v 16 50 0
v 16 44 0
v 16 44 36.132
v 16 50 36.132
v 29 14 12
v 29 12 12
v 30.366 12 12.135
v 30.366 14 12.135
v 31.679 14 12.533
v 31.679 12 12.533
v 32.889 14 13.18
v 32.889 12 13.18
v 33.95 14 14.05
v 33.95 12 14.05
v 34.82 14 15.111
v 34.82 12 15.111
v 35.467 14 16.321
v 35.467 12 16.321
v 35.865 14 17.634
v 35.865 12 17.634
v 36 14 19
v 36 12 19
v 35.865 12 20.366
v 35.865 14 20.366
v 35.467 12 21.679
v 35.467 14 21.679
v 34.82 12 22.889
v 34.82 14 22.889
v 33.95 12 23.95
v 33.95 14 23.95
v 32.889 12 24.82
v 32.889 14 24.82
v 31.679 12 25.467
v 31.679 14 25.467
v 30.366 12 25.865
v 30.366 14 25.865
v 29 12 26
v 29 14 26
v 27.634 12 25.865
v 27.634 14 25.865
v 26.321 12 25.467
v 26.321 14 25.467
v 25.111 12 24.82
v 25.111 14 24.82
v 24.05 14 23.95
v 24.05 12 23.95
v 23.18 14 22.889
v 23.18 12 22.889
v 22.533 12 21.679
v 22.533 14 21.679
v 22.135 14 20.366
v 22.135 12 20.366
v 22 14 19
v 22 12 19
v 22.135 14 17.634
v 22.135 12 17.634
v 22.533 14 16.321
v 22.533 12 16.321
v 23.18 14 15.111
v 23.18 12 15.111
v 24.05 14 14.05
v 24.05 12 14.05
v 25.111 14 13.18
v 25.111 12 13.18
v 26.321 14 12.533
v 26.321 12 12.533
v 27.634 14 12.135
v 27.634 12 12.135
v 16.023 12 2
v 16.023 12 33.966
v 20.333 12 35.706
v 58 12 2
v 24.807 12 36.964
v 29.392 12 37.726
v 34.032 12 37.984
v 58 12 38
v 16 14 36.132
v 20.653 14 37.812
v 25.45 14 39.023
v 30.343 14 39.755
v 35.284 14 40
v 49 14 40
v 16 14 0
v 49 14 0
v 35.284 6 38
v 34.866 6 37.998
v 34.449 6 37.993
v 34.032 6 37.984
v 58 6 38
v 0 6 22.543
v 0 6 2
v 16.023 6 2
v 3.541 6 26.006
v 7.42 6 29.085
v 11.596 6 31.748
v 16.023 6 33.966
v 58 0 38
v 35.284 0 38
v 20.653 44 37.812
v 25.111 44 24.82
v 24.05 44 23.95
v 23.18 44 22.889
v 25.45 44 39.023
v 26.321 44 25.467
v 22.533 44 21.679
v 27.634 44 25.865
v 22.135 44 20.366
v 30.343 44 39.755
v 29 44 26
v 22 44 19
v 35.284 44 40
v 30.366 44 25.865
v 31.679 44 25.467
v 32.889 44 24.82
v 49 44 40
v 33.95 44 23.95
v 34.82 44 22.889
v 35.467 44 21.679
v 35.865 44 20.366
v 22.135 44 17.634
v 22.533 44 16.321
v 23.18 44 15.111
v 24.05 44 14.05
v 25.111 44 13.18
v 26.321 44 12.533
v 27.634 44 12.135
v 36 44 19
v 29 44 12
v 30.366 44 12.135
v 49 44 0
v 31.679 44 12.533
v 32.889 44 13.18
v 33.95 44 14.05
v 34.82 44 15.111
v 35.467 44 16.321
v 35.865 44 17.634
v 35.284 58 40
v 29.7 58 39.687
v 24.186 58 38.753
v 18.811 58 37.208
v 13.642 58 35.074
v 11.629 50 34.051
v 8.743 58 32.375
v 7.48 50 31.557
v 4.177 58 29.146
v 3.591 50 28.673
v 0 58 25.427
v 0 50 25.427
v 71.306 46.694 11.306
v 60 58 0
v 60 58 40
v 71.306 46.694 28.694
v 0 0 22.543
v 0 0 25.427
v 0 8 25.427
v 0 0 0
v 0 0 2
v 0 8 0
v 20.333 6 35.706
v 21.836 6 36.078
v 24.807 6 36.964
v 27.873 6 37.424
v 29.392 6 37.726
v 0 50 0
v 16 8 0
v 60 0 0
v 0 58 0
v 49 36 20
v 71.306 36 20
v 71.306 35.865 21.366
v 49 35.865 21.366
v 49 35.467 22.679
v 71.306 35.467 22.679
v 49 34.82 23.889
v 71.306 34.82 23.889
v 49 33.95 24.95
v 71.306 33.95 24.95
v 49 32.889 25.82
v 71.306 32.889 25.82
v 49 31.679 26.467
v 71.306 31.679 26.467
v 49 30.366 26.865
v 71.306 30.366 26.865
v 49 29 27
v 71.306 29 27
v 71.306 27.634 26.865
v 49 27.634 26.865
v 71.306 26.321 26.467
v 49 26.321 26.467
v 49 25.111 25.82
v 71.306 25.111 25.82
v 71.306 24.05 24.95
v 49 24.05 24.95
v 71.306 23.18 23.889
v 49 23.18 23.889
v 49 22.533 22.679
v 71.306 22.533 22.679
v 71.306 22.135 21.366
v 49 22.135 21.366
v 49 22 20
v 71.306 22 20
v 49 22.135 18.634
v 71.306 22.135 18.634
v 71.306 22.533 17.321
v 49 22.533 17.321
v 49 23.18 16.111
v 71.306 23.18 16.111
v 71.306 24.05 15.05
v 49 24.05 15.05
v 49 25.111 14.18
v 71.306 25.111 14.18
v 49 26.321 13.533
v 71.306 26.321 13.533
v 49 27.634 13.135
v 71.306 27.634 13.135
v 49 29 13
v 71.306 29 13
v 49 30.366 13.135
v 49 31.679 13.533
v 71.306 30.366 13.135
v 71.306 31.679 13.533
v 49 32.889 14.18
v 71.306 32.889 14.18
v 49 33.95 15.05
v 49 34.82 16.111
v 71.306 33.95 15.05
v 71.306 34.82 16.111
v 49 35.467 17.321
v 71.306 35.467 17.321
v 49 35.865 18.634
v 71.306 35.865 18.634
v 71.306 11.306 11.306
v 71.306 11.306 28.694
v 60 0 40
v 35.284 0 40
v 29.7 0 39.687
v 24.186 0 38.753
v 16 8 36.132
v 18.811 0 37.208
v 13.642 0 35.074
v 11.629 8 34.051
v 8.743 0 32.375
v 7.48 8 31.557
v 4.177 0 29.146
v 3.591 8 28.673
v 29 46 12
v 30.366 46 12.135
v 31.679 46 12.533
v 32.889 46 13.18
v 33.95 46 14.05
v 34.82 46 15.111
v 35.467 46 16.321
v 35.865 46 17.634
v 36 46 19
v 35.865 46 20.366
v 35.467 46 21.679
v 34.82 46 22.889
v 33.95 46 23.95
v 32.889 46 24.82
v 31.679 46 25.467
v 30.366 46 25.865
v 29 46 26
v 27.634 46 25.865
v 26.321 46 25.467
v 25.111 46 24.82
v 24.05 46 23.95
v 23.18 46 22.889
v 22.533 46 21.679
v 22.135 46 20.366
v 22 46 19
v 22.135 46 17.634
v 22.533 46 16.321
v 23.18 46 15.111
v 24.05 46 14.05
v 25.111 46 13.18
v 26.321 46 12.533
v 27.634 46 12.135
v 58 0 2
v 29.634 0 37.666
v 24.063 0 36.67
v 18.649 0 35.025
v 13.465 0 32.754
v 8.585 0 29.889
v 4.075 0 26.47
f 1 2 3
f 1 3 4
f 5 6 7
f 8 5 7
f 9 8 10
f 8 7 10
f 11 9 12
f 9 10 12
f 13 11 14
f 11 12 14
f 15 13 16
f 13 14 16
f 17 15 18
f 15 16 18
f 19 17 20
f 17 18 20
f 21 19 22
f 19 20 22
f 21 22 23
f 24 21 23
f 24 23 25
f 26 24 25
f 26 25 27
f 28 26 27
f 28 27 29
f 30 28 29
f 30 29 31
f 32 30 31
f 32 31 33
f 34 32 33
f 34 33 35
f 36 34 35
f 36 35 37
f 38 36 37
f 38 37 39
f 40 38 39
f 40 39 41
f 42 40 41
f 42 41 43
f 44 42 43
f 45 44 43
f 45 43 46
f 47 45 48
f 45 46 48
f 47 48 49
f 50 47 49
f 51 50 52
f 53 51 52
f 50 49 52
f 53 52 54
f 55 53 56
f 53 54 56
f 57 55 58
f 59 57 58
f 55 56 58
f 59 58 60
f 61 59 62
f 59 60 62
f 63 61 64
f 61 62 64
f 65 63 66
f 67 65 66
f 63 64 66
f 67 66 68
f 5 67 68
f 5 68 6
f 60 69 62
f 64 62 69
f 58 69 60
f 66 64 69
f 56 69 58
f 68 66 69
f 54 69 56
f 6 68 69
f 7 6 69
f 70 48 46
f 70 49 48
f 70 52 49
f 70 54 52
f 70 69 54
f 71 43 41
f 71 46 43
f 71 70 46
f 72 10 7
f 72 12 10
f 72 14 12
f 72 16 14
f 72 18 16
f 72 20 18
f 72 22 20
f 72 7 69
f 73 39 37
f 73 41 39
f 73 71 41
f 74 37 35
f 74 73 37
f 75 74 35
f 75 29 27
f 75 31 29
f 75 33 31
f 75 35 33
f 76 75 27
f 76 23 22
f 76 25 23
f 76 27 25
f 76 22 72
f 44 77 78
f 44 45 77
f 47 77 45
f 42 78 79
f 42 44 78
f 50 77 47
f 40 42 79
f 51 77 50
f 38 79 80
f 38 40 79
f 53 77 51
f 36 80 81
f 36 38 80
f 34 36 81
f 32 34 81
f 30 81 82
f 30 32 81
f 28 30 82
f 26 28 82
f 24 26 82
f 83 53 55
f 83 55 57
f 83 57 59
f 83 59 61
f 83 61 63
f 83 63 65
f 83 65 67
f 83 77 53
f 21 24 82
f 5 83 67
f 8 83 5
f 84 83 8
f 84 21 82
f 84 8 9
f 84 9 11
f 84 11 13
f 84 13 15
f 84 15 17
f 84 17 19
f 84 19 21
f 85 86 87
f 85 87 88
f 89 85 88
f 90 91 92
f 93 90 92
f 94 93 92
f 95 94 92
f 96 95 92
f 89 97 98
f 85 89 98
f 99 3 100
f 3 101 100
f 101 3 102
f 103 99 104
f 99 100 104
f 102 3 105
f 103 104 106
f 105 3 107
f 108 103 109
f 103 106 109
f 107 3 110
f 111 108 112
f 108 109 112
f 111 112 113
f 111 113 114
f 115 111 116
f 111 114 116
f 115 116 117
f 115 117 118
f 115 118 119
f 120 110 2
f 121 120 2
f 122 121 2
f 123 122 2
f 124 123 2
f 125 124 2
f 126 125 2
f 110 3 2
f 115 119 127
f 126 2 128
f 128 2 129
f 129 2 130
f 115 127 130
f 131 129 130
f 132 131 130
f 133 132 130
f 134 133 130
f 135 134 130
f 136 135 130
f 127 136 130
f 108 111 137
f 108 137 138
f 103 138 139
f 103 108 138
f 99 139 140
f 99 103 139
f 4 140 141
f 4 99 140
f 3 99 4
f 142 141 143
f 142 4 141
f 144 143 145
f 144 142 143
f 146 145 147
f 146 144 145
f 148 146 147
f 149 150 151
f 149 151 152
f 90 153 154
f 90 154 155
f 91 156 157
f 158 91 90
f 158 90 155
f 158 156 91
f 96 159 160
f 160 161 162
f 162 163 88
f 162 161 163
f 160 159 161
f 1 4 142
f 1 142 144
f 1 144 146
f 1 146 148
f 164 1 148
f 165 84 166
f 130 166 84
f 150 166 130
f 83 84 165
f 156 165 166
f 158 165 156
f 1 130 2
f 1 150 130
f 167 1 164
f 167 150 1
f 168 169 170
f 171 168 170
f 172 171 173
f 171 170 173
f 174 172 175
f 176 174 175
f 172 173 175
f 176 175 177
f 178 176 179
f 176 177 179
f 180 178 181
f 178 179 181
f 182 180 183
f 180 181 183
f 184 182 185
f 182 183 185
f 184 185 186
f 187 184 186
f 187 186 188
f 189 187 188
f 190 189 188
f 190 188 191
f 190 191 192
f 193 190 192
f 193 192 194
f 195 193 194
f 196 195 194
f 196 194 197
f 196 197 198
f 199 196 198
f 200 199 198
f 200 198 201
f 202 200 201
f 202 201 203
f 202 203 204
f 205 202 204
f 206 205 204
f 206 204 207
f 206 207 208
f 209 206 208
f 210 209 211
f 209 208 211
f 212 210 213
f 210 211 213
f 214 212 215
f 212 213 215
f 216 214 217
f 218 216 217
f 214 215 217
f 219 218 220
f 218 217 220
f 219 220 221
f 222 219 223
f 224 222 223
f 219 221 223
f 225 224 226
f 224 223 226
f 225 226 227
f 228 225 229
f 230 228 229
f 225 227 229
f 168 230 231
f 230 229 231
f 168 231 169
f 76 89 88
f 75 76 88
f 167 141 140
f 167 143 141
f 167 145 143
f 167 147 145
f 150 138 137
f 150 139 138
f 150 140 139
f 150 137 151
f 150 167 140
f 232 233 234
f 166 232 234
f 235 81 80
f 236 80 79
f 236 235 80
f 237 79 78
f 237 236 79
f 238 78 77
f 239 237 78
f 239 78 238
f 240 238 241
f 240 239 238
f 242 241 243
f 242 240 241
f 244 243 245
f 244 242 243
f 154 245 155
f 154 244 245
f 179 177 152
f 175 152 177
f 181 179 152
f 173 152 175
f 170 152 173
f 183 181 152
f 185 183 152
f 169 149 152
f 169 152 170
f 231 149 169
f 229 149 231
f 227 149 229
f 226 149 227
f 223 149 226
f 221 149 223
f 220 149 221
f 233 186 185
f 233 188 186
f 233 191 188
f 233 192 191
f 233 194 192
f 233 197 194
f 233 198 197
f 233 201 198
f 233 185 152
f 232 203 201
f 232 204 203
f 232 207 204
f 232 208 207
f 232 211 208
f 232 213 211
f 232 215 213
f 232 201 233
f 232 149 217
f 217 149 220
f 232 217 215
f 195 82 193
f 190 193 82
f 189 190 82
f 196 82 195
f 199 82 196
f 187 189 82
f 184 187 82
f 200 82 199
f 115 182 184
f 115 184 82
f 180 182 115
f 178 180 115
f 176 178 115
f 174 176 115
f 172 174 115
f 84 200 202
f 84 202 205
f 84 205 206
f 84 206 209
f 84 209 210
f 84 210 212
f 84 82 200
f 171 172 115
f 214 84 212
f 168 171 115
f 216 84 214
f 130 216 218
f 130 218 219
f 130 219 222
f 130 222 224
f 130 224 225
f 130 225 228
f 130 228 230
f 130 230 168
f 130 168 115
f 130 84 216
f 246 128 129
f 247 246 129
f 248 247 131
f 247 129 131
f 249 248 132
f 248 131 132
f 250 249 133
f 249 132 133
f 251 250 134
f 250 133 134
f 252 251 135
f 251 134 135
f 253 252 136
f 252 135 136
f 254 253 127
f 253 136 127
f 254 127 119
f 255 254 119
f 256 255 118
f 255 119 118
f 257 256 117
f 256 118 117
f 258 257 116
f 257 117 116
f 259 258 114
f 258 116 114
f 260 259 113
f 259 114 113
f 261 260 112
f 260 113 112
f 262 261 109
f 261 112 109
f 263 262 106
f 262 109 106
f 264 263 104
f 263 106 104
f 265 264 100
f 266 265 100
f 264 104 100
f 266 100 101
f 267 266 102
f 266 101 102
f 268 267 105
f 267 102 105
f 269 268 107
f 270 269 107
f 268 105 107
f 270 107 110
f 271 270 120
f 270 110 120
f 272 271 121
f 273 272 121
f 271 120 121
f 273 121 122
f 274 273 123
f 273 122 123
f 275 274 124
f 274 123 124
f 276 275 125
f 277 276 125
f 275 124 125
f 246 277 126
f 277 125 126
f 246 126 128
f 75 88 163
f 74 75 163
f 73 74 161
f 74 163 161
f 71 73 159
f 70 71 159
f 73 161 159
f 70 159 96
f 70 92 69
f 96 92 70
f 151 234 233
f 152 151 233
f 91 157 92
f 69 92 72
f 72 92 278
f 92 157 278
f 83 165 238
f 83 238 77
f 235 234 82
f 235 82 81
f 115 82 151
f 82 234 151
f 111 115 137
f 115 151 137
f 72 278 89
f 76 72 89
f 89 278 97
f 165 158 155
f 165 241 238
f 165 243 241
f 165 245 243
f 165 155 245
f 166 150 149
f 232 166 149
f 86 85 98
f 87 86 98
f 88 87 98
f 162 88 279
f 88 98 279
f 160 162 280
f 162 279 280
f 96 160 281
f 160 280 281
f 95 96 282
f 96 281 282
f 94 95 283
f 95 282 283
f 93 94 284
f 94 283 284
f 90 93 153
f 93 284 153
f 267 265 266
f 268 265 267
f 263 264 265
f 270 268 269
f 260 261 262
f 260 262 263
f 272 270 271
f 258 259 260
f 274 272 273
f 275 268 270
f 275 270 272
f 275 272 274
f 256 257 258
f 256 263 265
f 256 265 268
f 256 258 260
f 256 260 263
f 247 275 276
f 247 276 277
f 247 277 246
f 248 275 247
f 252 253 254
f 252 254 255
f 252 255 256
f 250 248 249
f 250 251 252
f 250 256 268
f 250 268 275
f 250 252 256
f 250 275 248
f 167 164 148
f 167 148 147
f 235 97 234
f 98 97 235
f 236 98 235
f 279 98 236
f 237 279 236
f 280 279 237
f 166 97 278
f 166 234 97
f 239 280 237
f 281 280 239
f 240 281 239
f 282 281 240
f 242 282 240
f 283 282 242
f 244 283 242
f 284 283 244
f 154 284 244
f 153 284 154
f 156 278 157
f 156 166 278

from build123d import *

# Parameters (mm, degrees)
BOSS_EXTRUDE1_DEPTH = 40
CUT_EXTRUDE2_DEPTH  = 101.242224803
CUT_EXTRUDE3_DEPTH  = 101.242224803
SKETCH14_R          = 7
CUT_EXTRUDE4_DEPTH  = 101.242224803
CUT_EXTRUDE5_REACH  = 102.242
SKETCH15_R          = 7
SKETCH16_R          = 7
CUT_EXTRUDE6_DEPTH  = 2
CUT_EXTRUDE9_DEPTH  = 6
SKETCH22_W          = 41.976716328
SKETCH22_H          = 31.966333102
CUT_EXTRUDE11_DEPTH = 6
CUT_EXTRUDE12_DEPTH = 6


with BuildPart() as part:
    # Sketch2 → Boss-Extrude1 (new body)
    with BuildSketch(Plane.XY):
        Polygon((60, 58), (71.305705476, 46.694294524), (71.305705476, 11.305705476), (60, 0), (0, 0), (0, 8), (16, 8), (16, 14), (49, 14), (49, 44), (45.974238177, 44), (16, 44), (16, 50), (0, 50), (0, 58), align=None)
    extrude(amount=BOSS_EXTRUDE1_DEPTH)

    # Sketch4 → Cut-Extrude2 (cut, through all)
    with BuildSketch(Plane.XZ):
        with BuildLine():
            Line((0, 25.426887123), (0, 40))
            Line((0, 40), (35.283645911, 40))
            ThreePointArc((35.283645911, 40), (16.196272547, 36.213333337), (0, 25.426887123))
        make_face()
    extrude(amount=-CUT_EXTRUDE2_DEPTH, mode=Mode.SUBTRACT)

    # Sketch12 → Cut-Extrude3 (cut, through all)
    with BuildSketch(Plane(origin=(0, 0, 0), x_dir=(1, 0, 0), z_dir=(0, 1, 0))):
        Polygon((60, 0), (71.305705476, -11.305705476), (71.305705476, 0), align=None)
        Polygon((60, -40), (71.305705476, -28.694294524), (71.305705476, -40), align=None)
    extrude(amount=CUT_EXTRUDE3_DEPTH, mode=Mode.SUBTRACT)

    # Sketch14 → Cut-Extrude4 (cut, through all)
    with BuildSketch(Plane(origin=(71.305705476, 0, 0), x_dir=(0, 0, -1), z_dir=(1, 0, 0))):
        with Locations(Location((-20, 29, 0), (0, 0, 90))):
            Circle(SKETCH14_R)
    extrude(amount=-CUT_EXTRUDE4_DEPTH, mode=Mode.SUBTRACT)

    # Sketch15 → Cut-Extrude5 (cut, up to next)
    with BuildSketch(Plane.XZ, mode=Mode.PRIVATE) as cut_extrude5_sk1:
        with Locations(Location((29, 19, 0), (0, 0, 270))):
            Circle(SKETCH15_R)
    cut_extrude5_tool1 = extrude(cut_extrude5_sk1.sketch, amount=-CUT_EXTRUDE5_REACH, mode=Mode.PRIVATE) & part.part
    add(cut_extrude5_tool1.solids().sort_by_distance((29, 0, 19))[0], mode=Mode.SUBTRACT)

    # Sketch16 → Cut-Extrude6 (cut)
    with BuildSketch(Plane.XZ.offset(-44)):
        with Locations(Location((29, 19, 0), (0, 0, 270))):
            Circle(SKETCH16_R)
    extrude(amount=-CUT_EXTRUDE6_DEPTH, mode=Mode.SUBTRACT)

    # Sketch21 → Cut-Extrude9 (cut)
    with BuildSketch(Plane.XZ):
        with BuildLine():
            Line((0, 22.543268601), (0, 2))
            Line((0, 2), (58, 2))
            Line((58, 2), (58, 38))
            Line((58, 38), (35.283645911, 38))
            ThreePointArc((35.283645911, 38), (16.023283672, 33.966333102), (0, 22.543268601))
        make_face()
    extrude(amount=-CUT_EXTRUDE9_DEPTH, mode=Mode.SUBTRACT)

    # Sketch22 → Cut-Extrude11 (cut)
    with BuildSketch(Plane.XZ.offset(-6)):
        with Locations((37.011641836, 17.983166551)):
            Rectangle(SKETCH22_W, SKETCH22_H)
    extrude(amount=-CUT_EXTRUDE11_DEPTH, mode=Mode.SUBTRACT)

    # Sketch23 → Cut-Extrude12 (cut)
    with BuildSketch(Plane.XZ.offset(-6)):
        with BuildLine():
            Line((16.023283672, 33.966333102), (58, 33.966333102))
            Line((58, 33.966333102), (58, 38))
            Line((58, 38), (34.032069155, 37.983680097))
            ThreePointArc((34.032069155, 37.983680097), (24.80704409, 36.964047425), (16.023283672, 33.966333102))
        make_face()
    extrude(amount=-CUT_EXTRUDE12_DEPTH, mode=Mode.SUBTRACT)


solid = part.part
